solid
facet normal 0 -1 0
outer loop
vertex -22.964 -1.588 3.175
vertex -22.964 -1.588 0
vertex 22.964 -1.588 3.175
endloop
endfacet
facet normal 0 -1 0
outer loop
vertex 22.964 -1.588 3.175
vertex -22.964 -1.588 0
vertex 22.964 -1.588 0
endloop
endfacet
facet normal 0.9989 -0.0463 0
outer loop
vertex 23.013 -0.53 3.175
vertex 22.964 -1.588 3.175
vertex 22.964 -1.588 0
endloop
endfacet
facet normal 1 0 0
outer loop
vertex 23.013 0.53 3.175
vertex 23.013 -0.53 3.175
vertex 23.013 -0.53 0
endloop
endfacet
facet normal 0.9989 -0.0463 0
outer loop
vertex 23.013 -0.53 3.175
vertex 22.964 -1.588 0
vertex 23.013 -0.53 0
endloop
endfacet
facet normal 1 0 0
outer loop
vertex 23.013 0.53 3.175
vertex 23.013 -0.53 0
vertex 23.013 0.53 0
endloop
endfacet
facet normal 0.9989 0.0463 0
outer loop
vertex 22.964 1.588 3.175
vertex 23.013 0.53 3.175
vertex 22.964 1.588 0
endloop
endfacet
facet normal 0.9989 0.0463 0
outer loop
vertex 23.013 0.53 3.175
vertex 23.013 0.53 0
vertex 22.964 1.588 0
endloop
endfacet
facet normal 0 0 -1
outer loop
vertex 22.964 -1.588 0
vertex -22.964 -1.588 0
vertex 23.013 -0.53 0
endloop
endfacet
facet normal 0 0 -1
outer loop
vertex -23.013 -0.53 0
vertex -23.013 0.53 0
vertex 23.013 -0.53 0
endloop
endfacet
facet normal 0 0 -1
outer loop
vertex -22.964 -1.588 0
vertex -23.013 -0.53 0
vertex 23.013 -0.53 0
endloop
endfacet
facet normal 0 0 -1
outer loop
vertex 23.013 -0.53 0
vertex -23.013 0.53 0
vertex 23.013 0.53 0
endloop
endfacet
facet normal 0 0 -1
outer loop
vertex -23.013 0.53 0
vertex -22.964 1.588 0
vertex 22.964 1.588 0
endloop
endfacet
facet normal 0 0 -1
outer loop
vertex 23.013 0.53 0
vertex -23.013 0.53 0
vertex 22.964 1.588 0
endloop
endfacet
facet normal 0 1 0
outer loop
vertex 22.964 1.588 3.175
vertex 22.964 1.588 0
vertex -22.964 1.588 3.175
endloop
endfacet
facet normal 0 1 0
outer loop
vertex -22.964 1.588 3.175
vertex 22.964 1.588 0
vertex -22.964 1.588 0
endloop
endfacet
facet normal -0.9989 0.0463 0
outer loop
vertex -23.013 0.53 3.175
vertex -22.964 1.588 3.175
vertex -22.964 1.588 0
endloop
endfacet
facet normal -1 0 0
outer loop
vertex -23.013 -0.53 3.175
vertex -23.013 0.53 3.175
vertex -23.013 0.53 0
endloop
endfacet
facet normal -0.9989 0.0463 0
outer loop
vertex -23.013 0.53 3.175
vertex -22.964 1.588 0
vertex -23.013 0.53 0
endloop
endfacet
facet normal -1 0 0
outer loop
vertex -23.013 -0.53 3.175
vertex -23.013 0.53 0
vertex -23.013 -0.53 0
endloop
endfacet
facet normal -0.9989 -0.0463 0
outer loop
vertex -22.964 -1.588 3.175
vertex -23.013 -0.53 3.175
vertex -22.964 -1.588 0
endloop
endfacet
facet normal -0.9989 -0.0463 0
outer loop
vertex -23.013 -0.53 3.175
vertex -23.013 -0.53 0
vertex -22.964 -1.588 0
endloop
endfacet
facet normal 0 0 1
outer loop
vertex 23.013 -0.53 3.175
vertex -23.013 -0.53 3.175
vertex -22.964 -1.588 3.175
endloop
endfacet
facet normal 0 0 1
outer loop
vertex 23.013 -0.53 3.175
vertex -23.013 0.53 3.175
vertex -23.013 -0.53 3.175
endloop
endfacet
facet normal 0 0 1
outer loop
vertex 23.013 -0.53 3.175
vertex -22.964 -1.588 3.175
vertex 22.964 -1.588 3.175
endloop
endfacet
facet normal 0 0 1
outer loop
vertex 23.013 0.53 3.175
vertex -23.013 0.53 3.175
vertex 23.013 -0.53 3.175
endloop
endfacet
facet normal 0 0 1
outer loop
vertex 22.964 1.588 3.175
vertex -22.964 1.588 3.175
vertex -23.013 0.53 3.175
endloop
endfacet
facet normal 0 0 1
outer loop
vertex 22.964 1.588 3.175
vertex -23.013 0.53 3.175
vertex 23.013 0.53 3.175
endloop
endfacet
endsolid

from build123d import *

# Parameters (mm, degrees)
BOSS_EXTRUDE1_DEPTH = 5.13588
SKETCH2_R           = 19.84375
CUT_EXTRUDE1_DEPTH  = 1.96088
SKETCH4_W           = 53.14157338
SKETCH4_H           = 10.064691928
CUT_EXTRUDE3_DEPTH  = 4.175


with BuildPart() as part:
    # Sketch1 → Boss-Extrude1 (new body)
    with BuildSketch(Plane.XY):
        with BuildLine():
            Line((-22.963943375, -1.5875), (22.963943375, -1.5875))
            ThreePointArc((22.963943375, -1.5875), (23.01875, 0), (22.963943375, 1.5875))
            Line((22.963943375, 1.5875), (-22.963943375, 1.5875))
            ThreePointArc((-22.963943375, 1.5875), (-23.01875, 0), (-22.963943375, -1.5875))
        make_face()
    extrude(amount=BOSS_EXTRUDE1_DEPTH)

    # Sketch2 → Cut-Extrude1 (cut)
    with BuildSketch(Plane.XY.offset(5.13588)):
        Circle(SKETCH2_R)
    extrude(amount=-CUT_EXTRUDE1_DEPTH, mode=Mode.SUBTRACT)

    # Sketch4 → Cut-Extrude3 (cut, through all)
    with BuildSketch(Plane(origin=(0, 1.5875, 0), x_dir=(1, 0, 0), z_dir=(0, 1, 0))):
        with Locations((-0.065706256, -8.207345964)):
            Rectangle(SKETCH4_W, SKETCH4_H)
    extrude(amount=-CUT_EXTRUDE3_DEPTH, mode=Mode.SUBTRACT)


solid = part.part
